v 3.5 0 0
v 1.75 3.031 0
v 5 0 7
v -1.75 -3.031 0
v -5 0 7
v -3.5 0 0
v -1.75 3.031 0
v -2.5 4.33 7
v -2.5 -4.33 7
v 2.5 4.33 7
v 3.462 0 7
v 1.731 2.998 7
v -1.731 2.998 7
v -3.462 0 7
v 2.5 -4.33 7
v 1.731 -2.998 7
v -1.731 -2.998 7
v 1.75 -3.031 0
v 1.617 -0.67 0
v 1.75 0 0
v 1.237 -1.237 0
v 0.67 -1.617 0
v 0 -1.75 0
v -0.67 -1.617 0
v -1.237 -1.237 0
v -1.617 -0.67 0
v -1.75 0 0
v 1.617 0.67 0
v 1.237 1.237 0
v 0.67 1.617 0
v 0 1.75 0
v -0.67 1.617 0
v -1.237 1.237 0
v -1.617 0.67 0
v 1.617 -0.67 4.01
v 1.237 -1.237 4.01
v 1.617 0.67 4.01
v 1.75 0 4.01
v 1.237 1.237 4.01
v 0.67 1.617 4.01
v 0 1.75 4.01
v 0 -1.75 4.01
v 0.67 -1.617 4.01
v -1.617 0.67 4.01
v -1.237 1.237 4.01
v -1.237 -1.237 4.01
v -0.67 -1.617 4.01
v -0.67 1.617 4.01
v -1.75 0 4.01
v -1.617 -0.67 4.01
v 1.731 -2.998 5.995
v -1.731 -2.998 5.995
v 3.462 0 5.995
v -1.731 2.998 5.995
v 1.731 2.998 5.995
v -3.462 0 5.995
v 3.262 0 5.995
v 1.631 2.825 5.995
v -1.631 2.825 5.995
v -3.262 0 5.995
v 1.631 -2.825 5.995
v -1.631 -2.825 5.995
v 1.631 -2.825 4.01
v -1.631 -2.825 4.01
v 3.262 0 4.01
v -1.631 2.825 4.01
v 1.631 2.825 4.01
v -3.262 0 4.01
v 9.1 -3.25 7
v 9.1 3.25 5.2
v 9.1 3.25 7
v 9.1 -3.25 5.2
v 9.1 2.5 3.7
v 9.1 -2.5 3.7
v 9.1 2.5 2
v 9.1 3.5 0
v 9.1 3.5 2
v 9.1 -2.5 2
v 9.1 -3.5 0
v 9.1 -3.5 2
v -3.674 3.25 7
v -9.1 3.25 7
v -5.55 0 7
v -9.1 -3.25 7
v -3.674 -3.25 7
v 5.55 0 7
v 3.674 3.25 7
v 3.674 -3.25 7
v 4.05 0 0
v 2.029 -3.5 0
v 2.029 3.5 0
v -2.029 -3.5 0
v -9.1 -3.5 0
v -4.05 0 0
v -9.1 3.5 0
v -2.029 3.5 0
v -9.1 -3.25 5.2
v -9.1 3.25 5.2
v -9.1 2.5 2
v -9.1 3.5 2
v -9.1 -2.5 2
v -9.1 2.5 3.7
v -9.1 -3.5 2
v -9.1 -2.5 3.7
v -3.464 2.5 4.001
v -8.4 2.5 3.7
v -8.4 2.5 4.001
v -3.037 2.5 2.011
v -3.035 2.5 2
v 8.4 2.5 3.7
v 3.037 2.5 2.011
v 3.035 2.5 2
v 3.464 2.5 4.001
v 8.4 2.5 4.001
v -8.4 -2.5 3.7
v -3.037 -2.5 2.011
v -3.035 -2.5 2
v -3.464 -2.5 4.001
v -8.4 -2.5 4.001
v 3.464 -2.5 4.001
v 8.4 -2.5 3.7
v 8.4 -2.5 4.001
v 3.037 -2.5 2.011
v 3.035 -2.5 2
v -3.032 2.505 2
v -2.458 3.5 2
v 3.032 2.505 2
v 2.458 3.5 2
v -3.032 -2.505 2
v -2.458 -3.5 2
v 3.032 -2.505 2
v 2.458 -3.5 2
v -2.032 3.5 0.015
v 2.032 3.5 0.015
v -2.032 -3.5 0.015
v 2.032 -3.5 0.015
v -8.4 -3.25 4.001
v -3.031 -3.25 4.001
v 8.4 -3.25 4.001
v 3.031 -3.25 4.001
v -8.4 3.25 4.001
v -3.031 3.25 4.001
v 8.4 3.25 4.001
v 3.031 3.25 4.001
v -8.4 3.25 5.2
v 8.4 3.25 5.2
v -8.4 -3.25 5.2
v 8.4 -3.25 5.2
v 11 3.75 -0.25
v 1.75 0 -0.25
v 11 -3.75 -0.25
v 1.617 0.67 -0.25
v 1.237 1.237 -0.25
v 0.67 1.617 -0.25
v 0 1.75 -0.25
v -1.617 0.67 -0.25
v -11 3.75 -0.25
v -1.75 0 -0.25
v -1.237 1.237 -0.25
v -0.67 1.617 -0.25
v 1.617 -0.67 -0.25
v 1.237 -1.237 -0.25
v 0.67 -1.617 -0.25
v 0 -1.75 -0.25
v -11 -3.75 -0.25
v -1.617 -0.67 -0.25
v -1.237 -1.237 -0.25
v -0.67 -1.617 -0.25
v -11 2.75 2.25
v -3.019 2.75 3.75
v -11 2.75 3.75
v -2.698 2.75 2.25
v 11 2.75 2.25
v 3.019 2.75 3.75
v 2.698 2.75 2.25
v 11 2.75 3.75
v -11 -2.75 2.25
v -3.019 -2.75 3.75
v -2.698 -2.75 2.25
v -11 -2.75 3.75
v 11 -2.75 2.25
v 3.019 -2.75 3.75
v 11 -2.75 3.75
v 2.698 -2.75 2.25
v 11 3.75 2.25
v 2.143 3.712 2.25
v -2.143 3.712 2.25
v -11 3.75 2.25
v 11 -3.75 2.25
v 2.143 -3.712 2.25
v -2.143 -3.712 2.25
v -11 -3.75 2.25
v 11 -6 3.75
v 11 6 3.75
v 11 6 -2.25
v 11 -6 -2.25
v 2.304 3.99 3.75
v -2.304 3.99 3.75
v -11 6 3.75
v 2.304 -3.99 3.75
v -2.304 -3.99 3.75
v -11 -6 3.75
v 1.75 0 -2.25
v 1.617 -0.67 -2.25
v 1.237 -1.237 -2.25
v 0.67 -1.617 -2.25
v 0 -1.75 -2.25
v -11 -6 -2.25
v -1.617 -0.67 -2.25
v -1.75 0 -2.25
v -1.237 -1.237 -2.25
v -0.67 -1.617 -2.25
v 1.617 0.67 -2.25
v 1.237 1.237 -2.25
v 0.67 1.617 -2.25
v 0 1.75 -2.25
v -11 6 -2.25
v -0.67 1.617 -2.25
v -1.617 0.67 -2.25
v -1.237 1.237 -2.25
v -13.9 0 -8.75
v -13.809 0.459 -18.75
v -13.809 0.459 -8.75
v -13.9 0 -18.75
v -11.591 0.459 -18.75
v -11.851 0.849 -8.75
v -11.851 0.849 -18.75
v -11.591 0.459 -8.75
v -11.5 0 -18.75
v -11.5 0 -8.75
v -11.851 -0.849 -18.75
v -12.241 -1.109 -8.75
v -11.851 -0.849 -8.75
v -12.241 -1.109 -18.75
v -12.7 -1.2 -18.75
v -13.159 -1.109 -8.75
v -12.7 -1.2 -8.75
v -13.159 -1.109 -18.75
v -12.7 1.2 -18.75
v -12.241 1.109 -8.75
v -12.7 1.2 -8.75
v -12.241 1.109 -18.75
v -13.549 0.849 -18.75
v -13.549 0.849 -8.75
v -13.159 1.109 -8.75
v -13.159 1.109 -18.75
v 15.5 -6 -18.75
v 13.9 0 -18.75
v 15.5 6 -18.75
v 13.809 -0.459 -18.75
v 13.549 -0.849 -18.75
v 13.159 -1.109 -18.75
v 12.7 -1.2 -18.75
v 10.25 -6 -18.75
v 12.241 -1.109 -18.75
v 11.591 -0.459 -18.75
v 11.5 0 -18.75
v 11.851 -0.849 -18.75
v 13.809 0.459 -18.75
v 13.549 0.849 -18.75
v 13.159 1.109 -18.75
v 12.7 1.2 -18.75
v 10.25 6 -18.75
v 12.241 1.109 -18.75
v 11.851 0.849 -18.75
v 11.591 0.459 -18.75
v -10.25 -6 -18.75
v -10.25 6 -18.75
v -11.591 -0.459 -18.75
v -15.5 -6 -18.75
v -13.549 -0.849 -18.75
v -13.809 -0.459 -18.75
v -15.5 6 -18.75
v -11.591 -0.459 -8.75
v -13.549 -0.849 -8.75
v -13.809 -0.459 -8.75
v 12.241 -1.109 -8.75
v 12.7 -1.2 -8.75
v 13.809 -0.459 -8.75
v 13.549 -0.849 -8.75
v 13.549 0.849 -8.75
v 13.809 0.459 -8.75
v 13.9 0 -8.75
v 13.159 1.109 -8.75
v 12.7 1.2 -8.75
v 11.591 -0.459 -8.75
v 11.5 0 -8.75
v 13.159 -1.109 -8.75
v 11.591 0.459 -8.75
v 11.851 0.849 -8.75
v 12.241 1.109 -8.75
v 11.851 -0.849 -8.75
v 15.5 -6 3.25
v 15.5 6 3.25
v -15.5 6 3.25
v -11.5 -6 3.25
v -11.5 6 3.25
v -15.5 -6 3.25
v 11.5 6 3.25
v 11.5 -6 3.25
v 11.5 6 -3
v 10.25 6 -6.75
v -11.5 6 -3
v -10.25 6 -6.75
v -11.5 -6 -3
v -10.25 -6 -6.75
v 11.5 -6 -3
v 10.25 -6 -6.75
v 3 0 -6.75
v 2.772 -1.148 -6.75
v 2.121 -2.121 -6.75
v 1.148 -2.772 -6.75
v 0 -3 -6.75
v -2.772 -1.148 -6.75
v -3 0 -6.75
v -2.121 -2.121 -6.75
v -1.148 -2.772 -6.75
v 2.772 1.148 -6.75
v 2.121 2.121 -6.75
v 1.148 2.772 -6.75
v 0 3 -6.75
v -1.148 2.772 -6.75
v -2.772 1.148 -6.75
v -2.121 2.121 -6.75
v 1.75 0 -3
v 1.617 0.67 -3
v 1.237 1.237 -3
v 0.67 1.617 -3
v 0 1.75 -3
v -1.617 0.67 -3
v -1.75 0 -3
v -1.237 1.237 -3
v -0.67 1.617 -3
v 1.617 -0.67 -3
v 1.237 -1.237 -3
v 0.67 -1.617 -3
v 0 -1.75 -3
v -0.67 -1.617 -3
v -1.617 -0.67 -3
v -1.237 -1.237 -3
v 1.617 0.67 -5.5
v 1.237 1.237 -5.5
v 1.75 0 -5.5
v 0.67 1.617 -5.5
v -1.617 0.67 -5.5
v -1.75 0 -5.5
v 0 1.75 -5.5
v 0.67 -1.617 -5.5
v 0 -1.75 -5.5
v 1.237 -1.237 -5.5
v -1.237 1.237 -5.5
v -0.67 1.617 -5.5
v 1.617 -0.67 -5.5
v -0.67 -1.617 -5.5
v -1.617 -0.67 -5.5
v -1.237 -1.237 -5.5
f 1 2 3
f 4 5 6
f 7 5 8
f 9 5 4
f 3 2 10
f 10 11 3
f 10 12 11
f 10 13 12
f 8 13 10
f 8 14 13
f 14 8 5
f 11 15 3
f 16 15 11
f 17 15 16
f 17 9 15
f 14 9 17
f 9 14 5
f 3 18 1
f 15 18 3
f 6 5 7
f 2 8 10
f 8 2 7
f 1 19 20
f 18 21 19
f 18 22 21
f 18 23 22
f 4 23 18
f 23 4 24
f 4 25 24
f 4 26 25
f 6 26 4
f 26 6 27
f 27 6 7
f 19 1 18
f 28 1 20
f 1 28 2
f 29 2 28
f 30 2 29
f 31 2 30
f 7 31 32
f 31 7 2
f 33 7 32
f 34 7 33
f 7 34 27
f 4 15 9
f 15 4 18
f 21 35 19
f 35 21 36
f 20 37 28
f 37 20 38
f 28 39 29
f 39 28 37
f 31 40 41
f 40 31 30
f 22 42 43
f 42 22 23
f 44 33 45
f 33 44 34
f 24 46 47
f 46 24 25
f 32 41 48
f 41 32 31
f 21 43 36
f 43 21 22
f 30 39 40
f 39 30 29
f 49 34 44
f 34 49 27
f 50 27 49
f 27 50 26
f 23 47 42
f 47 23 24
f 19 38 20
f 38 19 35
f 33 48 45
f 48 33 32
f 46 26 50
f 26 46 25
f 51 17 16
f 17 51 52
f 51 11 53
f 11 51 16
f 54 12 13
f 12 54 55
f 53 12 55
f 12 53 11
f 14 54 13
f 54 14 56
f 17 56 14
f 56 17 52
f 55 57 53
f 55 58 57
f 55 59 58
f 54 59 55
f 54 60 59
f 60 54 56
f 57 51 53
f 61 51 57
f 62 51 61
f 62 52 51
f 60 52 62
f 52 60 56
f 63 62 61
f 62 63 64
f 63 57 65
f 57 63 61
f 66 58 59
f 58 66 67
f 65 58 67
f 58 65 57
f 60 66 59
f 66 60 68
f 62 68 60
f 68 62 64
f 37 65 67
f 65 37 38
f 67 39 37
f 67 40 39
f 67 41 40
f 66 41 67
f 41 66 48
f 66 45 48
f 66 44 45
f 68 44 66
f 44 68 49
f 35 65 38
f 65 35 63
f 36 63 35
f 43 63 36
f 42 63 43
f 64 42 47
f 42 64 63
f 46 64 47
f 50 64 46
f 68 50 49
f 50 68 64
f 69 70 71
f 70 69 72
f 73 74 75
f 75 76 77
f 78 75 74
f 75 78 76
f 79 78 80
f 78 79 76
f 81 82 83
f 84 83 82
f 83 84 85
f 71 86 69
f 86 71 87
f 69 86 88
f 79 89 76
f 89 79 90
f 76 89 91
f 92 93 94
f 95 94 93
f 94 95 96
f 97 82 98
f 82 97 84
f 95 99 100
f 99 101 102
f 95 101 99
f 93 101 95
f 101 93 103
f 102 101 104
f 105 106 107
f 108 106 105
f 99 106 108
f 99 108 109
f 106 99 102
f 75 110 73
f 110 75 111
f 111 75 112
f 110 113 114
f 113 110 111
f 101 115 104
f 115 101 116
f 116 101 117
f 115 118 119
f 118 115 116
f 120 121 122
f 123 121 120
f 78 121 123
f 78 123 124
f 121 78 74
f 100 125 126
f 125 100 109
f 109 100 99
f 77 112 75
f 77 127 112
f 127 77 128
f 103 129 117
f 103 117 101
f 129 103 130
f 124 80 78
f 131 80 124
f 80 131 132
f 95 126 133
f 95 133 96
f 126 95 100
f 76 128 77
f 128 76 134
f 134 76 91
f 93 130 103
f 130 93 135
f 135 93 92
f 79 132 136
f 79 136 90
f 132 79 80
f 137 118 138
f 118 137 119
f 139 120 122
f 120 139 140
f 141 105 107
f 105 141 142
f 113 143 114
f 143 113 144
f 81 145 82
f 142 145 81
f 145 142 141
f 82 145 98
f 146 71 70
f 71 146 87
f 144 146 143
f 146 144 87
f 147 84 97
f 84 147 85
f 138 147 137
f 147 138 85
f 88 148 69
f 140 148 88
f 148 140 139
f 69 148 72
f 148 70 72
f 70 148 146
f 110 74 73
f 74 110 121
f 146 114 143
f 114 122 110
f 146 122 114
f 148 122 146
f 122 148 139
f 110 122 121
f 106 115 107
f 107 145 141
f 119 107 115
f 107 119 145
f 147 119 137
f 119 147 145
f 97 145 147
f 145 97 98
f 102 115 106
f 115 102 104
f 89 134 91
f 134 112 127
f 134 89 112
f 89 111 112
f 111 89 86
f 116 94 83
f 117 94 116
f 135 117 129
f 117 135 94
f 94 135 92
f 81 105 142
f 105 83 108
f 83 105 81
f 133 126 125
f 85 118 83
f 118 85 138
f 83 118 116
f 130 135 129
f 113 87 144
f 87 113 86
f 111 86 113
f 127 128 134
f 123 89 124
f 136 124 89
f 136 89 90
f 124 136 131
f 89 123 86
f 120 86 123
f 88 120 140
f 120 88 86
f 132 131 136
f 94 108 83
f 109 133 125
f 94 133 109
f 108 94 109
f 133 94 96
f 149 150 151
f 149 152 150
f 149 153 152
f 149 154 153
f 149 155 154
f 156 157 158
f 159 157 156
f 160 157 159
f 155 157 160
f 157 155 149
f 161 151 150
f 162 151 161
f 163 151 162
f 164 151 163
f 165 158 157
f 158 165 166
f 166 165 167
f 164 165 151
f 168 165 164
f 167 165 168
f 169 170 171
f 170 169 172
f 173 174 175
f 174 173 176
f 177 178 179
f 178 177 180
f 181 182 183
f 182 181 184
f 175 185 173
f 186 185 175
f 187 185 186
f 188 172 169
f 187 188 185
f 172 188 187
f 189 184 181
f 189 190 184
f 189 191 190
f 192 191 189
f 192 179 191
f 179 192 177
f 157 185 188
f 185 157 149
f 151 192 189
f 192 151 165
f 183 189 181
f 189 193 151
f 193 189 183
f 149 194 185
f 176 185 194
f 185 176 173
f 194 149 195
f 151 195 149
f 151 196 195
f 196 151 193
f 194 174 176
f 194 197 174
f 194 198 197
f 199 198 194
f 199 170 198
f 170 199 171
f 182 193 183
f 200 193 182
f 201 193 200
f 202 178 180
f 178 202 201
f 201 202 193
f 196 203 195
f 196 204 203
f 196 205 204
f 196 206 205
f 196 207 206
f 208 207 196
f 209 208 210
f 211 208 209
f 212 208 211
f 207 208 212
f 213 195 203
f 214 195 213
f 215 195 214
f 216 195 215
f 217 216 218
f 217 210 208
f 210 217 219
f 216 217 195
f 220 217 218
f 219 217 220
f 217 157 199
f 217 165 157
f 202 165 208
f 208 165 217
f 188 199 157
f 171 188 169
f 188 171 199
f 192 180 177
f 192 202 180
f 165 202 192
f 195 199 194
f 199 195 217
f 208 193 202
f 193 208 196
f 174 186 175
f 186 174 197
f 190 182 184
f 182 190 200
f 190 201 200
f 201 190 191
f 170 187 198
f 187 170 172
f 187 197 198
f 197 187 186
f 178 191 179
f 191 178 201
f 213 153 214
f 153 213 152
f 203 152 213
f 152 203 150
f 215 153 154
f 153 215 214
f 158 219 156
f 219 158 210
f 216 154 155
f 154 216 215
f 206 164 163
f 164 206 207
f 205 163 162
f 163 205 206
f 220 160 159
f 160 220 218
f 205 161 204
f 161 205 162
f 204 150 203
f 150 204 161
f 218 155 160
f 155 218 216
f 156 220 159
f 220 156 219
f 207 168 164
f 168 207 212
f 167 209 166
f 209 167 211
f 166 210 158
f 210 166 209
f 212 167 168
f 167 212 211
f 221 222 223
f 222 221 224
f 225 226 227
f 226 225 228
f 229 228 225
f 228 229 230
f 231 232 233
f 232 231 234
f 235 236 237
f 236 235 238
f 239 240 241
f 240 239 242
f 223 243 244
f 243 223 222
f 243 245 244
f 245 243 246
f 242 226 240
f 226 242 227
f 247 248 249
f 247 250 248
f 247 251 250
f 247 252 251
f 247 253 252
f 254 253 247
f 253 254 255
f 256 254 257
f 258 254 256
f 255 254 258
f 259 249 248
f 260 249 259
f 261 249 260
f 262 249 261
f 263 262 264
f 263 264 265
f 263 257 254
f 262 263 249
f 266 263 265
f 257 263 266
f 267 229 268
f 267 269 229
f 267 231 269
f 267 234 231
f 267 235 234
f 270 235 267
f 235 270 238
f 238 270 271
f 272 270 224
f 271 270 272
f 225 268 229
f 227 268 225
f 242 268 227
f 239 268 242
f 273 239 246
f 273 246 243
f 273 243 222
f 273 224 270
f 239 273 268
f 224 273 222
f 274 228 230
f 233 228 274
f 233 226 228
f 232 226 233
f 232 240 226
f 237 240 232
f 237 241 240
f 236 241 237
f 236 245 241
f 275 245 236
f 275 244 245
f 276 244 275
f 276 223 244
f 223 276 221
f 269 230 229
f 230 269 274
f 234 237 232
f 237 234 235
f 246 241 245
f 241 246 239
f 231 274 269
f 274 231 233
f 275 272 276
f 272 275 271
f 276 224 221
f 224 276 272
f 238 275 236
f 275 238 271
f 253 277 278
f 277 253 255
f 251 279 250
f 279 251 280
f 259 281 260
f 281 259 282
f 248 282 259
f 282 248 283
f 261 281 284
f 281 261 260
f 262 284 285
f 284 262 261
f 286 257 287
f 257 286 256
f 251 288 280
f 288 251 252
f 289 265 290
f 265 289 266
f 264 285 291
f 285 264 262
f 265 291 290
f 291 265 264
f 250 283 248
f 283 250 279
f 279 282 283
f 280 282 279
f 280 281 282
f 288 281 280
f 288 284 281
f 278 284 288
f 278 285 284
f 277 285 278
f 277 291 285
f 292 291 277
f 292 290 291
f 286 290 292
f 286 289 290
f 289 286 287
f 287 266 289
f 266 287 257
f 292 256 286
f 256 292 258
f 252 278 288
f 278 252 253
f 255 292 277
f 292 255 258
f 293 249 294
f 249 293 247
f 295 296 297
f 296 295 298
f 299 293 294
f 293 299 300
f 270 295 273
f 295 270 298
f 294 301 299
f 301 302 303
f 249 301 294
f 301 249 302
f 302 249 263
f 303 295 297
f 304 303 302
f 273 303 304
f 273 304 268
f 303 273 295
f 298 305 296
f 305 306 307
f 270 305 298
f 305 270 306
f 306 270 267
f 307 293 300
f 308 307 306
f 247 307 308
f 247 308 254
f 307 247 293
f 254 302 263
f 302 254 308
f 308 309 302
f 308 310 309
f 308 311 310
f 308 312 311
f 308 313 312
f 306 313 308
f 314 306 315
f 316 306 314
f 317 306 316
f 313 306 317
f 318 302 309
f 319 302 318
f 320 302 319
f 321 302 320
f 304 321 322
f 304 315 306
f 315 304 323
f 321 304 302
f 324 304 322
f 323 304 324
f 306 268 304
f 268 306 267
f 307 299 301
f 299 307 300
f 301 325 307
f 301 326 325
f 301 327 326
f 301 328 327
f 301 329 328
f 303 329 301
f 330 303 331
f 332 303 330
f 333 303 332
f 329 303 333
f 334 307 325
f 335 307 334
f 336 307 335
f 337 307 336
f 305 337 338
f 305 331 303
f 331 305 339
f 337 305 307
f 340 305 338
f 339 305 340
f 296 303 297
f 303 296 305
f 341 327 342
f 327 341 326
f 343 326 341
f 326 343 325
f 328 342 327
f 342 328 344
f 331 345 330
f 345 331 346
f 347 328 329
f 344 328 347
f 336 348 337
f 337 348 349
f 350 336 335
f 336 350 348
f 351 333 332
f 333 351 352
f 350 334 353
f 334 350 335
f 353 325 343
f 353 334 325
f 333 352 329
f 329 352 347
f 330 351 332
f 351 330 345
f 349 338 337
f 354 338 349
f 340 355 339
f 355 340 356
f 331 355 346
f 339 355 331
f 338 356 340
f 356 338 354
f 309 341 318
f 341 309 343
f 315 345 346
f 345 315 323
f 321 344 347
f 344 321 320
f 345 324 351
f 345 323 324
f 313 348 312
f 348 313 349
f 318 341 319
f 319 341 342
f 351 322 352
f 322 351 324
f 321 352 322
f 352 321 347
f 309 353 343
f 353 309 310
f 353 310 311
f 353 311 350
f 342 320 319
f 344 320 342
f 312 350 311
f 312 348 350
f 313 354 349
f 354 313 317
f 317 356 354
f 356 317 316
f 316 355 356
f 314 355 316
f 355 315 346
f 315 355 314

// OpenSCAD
// rupa u limu četvrtasta 15.5x15.5 - 16x16 mm
// debljina lima oko 1 mm
// neka konektor prođe 15x10 mm i raširi se na 16.5x10 mm
// neka širina za lim bude 2 mm

conus_d1=7; // small diameter of the conus
conus_d2=10; // large diameter of the conus
conus_h=7; // height of the conus


screw_hole=3.5;
screw_head_d1=6; // closer to top
screw_head_d2=0; // closer to screw
screw_head_h=3;
nut_d=5.65 * (2/sqrt(3));
nut_h=2.5;
nut_depth=1; // sunken depth
nut_d2=nut_d+0.4; // sunken enlarged space

slider_cut_clearance=1.1; // hex cut clearance
slider_y=conus_d1-2;
slider_x=16.0+2*slider_cut_clearance;
slider_z=conus_h;
slider_z2=2; // extra height
slider_y2=slider_y+slider_z2; // slider extra thick
slider_clearance=0.5;
slider_notch_x=0.7; // notch depth
slider_notch_z=1.5; // same as x
slider_notch_zoffset=-0.3;
slider_top_z=3;
slider_top_y=slider_y+slider_notch_z;

carrier_cube=[22,12,6];

connector_bottom_x=20; // 20 or 17
connector_bottom_y=12;
connector_bottom_z=12; // 9 or 12
connector_screw_x=25.4; // screw distance
connector_screw_d=2.4; // 1.8 for plastic 2.2 screw, 2.4 for DB9 spacer
connector_screw_depth=10;
connector_shell_thick=4;
connector_shell_x=31;
connector_shell_clearance=0.5;
connector_shell_clearance_slider_x=1.0;


cover_thick=2; // cover thickness
cover_clearance=0.7;
cover_cable_width=15;
cover_cable_z=15;

cover_inside_cut=[connector_shell_x,carrier_cube[1],carrier_cube[2]]+[0,0,connector_bottom_z+connector_shell_thick+9]+[1,1,1]*cover_clearance;

cover_box=cover_inside_cut+[1,1,0.5]*2*cover_thick;


module kajla_main(add_d=0)
{
        cylinder(d1=conus_d1+add_d, d2=conus_d2+add_d, h=conus_h, $fn=6, center=true);

}

module kajla(add_d=0)
{
  translate([0,0,conus_h/2])
  difference()
  {
    kajla_main(add_d=add_d);
    // hole
    cylinder(d=screw_hole,h=conus_h+0.001, $fn=16, center=true);
    // sunken depth for nut
    translate([0,0,conus_h/2-nut_depth/2])
      cylinder(d=nut_d2,h=nut_depth+0.01, $fn=6,center=true);
    // tight place for nut
    translate([0,0,conus_h/2-nut_depth/2-nut_h/2+0.01])
      cylinder(d=nut_d,h=nut_h, $fn=6,center=true);
  }
}

module slider_main(add_x=0, add=0)
{
  union()
  {
    cube([slider_x+add_x,slider_y+add,slider_z],center=true);
    // add enlarged part bottom
    translate([0,0,-slider_z/2+(slider_z2+add)/2])
      cube([slider_x+add_x,slider_y2+add,(slider_z2+add)],center=true);
    // add enlarged part on top
    // NEED print friendly cut 45 deg
    top_z=slider_top_z-0.001;
    if(1)
    translate([0,0,slider_z/2-(top_z)/2])
      cube([slider_x+add_x,slider_top_y,(top_z)],center=true);

  }
}

module slider()
{
  difference()
  {
    slider_main();
    kajla_main(add_d=slider_cut_clearance);
    // the notches (both sides in for loop)
    for(i=[-1:2:1])
      translate([(-slider_x/2+slider_notch_x/2)*i,0,-slider_z/2+2*slider_z2+slider_notch_z/2+slider_notch_zoffset])
        cube([slider_notch_x,slider_y2+0.01,slider_notch_z],center=true);
  }
}

module base()
{
  translate([0,0,-carrier_cube[2]/2+2*slider_z2-slider_clearance/2])
  difference()
  {
    cube(carrier_cube,center=true);
    // cut for slider
    translate([0,0,carrier_cube[2]/2+slider_z/2-2*slider_z2])
      slider_main(add_x=carrier_cube[0],add=slider_clearance);
    // cut for kajla
    translate([0,0,carrier_cube[2]/2+conus_h/2-2*slider_z2])
      kajla_main(add_d=slider_clearance);
    // cut for screw hole
    cylinder(d=screw_hole,h=carrier_cube[2]+0.01,$fn=16,center=true);
    // cut for screw head
    if(0)
    translate([0,0,-carrier_cube[2]/2+screw_head_h/2])
      cylinder(d1=screw_head_d1,d2=screw_head_d2,h=screw_head_h,$fn=16,center=true);
  }
}

module connector_shell()
{
 translate([0,0,slider_z/2-connector_shell_clearance/2-(connector_bottom_z+connector_shell_thick+carrier_cube[2])/2])
    difference()
    {
      shell_z=connector_bottom_z+connector_shell_thick+carrier_cube[2];
      cube([connector_shell_x,connector_bottom_y,shell_z],center=true);
      // cut for connector bottom
      translate([0,0,-shell_z/2+connector_bottom_z/2])
        cube([connector_bottom_x+connector_shell_clearance,connector_bottom_y,connector_bottom_z],center=true);
      // cut for slider holder
      translate([0,0,shell_z/2-carrier_cube[2]/2])
        cube(carrier_cube+[connector_shell_clearance_slider_x,0,connector_shell_clearance],center=true);
      // cut for screw hole
      cylinder(d=screw_hole,h=shell_z,$fn=16,center=true);
      // cuts for side screw
      for(i=[-1:2:1])
        translate([i*connector_screw_x/2,0,-shell_z/2+connector_screw_depth/2])
          cylinder(d=connector_screw_d,h=connector_screw_depth,$fn=16,center=true);
      // cut for screw head
      if(1)
      translate([0,0,-shell_z/2+connector_bottom_z+screw_head_h/2])
        cylinder(d1=screw_head_d1,d2=screw_head_d2,h=screw_head_h,$fn=16,center=true);
    }
}


module cover()
{
  translate([0,0,-12])
  difference()
  {
    cube(cover_box,center=true);
    // inside cut
    translate([0,0,cover_thick/2+0.01])
      cube(cover_inside_cut,center=true);
    // cable out cut
    translate([0,cover_box[1]/2-cover_thick/2,cover_box[2]/2-cover_cable_z/2])
      cube([cover_cable_width,cover_thick+0.02,cover_cable_z],center=true);
    if(0) // cross-section
    translate([0,50,0])
      cube([100,100,100],center=true);
  }
}


// connector-conus (hold)
if(1)
  kajla();
// connector-slider (hold)
if(1)
translate([0,0,slider_z/2])
  slider();

// conncetor-base
if(1)
  base();

// connector-shell
if(1)
  connector_shell();

if(0)
  cover();
